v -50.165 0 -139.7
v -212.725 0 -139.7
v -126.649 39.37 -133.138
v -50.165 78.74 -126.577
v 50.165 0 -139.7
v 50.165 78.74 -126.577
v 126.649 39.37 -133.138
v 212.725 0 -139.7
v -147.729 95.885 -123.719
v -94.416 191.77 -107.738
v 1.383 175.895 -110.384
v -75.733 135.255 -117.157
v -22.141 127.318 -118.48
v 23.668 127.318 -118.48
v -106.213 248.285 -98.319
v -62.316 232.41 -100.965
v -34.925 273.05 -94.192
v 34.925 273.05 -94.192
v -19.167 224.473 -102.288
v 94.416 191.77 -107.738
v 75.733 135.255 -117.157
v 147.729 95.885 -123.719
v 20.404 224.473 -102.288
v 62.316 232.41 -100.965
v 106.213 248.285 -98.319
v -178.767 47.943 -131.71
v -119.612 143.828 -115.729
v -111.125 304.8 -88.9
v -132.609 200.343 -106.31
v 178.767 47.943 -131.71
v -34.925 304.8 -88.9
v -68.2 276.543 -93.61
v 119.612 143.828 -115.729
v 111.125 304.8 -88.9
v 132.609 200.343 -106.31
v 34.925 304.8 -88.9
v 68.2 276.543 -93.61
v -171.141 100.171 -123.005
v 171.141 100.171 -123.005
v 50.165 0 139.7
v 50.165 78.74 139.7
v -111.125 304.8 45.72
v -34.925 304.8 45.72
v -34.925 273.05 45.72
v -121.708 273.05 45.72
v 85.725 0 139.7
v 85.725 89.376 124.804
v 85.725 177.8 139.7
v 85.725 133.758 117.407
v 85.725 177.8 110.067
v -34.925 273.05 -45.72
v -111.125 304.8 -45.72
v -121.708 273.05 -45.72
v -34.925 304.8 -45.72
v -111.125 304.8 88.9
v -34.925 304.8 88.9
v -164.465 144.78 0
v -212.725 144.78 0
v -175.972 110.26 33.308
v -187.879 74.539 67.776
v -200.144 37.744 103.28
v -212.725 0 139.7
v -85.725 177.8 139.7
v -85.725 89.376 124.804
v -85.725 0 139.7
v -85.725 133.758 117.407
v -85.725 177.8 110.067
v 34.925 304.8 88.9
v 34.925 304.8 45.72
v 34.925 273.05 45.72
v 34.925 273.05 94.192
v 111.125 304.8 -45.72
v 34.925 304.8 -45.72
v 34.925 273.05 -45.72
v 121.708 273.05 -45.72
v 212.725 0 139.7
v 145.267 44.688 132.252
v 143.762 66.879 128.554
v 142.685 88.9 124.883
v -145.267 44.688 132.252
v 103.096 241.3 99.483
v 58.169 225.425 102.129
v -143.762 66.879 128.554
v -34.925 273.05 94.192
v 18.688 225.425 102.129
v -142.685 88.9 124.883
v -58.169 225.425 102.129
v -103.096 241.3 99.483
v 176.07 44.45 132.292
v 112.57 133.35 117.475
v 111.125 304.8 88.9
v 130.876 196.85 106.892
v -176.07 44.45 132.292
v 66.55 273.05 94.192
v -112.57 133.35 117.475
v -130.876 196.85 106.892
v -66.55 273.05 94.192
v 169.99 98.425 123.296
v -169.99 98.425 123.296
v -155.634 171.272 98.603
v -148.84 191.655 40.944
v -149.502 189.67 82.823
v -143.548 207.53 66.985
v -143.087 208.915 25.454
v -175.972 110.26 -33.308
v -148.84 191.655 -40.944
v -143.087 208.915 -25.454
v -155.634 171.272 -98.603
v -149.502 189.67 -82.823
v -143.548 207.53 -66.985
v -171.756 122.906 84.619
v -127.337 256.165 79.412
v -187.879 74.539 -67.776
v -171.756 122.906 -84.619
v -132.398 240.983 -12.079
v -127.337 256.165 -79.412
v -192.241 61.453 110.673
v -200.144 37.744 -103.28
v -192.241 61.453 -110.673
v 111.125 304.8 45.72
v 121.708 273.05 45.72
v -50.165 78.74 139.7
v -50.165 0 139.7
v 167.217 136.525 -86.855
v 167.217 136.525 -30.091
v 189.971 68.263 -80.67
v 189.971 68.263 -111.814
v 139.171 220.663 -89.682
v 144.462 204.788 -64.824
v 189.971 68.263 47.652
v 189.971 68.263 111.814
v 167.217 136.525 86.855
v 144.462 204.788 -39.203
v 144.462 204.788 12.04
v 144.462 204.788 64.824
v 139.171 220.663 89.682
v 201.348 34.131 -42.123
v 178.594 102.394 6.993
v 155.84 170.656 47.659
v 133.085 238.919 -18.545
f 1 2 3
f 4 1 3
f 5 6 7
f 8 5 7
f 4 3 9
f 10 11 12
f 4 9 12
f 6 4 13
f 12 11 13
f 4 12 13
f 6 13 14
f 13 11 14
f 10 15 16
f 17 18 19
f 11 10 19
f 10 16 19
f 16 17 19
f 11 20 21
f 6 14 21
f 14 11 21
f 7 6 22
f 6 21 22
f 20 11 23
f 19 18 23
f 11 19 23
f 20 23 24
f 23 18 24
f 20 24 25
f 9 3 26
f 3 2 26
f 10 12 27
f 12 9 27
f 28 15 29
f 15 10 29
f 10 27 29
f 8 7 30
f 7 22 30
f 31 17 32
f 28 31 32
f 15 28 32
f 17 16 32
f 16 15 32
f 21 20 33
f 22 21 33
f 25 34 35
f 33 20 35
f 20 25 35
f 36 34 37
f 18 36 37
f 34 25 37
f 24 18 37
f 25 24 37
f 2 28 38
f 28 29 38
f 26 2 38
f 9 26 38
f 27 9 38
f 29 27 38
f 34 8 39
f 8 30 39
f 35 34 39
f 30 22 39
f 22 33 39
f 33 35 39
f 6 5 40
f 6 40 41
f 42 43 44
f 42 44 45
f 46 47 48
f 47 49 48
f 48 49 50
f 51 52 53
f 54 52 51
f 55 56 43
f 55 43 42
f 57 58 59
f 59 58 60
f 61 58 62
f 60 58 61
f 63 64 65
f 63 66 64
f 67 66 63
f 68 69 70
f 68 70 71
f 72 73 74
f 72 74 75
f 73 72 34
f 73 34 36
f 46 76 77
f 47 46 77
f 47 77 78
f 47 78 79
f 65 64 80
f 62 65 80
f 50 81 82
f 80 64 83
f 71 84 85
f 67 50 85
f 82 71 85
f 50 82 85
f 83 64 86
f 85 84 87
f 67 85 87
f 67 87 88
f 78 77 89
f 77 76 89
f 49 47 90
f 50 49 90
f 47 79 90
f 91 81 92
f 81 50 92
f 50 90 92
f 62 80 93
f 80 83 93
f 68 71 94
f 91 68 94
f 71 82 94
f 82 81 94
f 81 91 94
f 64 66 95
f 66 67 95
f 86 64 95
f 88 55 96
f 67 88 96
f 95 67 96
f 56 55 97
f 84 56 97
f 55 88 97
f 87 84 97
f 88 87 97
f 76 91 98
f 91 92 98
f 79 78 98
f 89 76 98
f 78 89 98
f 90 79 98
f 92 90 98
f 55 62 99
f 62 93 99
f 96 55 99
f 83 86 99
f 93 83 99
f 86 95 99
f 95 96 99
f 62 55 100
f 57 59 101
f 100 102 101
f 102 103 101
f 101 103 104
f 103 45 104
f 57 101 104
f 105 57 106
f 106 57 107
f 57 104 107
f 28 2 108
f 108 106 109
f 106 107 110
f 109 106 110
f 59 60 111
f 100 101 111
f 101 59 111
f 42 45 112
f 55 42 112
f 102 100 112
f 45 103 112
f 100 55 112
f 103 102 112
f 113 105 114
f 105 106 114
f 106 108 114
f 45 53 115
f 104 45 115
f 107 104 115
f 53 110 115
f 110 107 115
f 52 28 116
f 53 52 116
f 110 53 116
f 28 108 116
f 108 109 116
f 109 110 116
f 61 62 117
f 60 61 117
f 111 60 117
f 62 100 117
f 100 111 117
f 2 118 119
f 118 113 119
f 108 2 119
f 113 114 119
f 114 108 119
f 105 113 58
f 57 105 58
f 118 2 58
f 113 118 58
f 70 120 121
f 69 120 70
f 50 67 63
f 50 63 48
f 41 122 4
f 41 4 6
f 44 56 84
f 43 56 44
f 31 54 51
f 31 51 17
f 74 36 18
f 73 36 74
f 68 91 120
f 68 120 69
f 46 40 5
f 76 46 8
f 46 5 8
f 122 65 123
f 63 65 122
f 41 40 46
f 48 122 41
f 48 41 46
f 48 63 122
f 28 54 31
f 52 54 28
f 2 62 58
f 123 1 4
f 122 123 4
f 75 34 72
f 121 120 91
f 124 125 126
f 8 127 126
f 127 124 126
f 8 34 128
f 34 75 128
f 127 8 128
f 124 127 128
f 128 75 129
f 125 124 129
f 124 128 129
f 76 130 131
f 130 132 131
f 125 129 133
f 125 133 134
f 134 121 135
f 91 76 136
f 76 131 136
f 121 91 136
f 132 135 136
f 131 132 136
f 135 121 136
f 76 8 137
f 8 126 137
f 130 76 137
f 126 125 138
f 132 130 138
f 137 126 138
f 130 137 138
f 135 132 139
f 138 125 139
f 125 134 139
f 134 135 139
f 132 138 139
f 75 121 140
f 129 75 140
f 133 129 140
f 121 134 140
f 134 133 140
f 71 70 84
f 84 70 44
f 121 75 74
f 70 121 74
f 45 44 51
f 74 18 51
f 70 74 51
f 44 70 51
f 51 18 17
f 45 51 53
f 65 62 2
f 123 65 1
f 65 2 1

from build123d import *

# Parameters (mm, degrees)
CORTAR_EXTRUIR3_DEPTH   = 31.75
SALIENTE_EXTRUIR1_DEPTH = 48.26
SALIENTE_EXTRUIR2_START = -29.633333
CROQUIS7_W              = 171.45
CROQUIS7_H              = 177.8
SALIENTE_EXTRUIR2_DEPTH = 29.633333
CORTAR_EXTRUIR4_REACH   = 466.994
CROQUIS8_W              = 100.33
CROQUIS8_H              = 78.74


with BuildPart() as part:
    # Croquis2 → Recubrir1 section 0
    with BuildSketch(Plane(origin=(0, 0, 0), x_dir=(1, 0, 0), z_dir=(0, 1, 0))):
        with BuildLine():
            Line((212.725, -139.7), (-212.725, -139.7))
            Line((-212.725, -139.7), (-212.725, 139.7))
            Line((-212.725, 139.7), (212.725, 139.7))
            Line((212.725, 139.7), (212.725, -139.7))
        make_face()
    # Croquis3 → Recubrir1 section 1
    with BuildSketch(Plane(origin=(0, 304.8, 0), x_dir=(1, 0, 0), z_dir=(0, 1, 0))):
        with BuildLine():
            Line((111.125, -88.9), (-111.125, -88.9))
            Line((-111.125, -88.9), (-111.125, 88.9))
            Line((-111.125, 88.9), (111.125, 88.9))
            Line((111.125, 88.9), (111.125, -88.9))
        make_face()
    loft()

    # Croquis5 → Cortar-Extruir3 (cut)
    with BuildSketch(Plane(origin=(0, 304.8, 0), x_dir=(1, 0, 0), z_dir=(0, 1, 0))):
        Polygon((171.921254814, -45.72), (34.925, -45.72), (34.925, -107.229562049), (-34.925, -107.229562049), (-34.925, -45.72), (-171.921254814, -45.72), (-171.921254814, 45.72), (-34.925, 45.72), (-34.925, 107.229562049), (34.925, 107.229562049), (34.925, 45.72), (171.921254814, 45.72), align=None)
    extrude(amount=-CORTAR_EXTRUIR3_DEPTH, mode=Mode.SUBTRACT)

    # Croquis6 → Saliente-Extruir1 (add)
    with BuildSketch(Plane(origin=(-212.725, 0, 0), x_dir=(0, 0, -1), z_dir=(1, 0, 0))):
        Polygon((139.7, 0), (0, 144.78), (-139.7, 0), align=None)
    extrude(amount=SALIENTE_EXTRUIR1_DEPTH)

    # Croquis7 → Saliente-Extruir2 (add)
    with BuildSketch(Plane.XY.offset(139.7).offset(SALIENTE_EXTRUIR2_START)):
        with Locations((0, 88.9)):
            Rectangle(CROQUIS7_W, CROQUIS7_H)
    extrude(amount=SALIENTE_EXTRUIR2_DEPTH)

    # Cortar-Extruir4: up to this plane
    cortar_extruir4_end = Plane(origin=(0, 22.654054054, -135.924324324), z_dir=(0, -0.16439898730535737, 0.9863939238321437))
    # Croquis8 → Cortar-Extruir4 (cut, up to the surface)
    with BuildSketch(Plane.XY.offset(139.7), mode=Mode.PRIVATE) as cortar_extruir4_sk1:
        with Locations((0, 39.37)):
            Rectangle(CROQUIS8_W, CROQUIS8_H)
    cortar_extruir4_tool1 = split(extrude(cortar_extruir4_sk1.sketch, amount=-CORTAR_EXTRUIR4_REACH, mode=Mode.PRIVATE), bisect_by=cortar_extruir4_end, keep=Keep.BOTH, mode=Mode.PRIVATE)
    add(cortar_extruir4_tool1.solids().sort_by_distance((0, 39.37, 139.7))[0], mode=Mode.SUBTRACT)


solid = part.part
